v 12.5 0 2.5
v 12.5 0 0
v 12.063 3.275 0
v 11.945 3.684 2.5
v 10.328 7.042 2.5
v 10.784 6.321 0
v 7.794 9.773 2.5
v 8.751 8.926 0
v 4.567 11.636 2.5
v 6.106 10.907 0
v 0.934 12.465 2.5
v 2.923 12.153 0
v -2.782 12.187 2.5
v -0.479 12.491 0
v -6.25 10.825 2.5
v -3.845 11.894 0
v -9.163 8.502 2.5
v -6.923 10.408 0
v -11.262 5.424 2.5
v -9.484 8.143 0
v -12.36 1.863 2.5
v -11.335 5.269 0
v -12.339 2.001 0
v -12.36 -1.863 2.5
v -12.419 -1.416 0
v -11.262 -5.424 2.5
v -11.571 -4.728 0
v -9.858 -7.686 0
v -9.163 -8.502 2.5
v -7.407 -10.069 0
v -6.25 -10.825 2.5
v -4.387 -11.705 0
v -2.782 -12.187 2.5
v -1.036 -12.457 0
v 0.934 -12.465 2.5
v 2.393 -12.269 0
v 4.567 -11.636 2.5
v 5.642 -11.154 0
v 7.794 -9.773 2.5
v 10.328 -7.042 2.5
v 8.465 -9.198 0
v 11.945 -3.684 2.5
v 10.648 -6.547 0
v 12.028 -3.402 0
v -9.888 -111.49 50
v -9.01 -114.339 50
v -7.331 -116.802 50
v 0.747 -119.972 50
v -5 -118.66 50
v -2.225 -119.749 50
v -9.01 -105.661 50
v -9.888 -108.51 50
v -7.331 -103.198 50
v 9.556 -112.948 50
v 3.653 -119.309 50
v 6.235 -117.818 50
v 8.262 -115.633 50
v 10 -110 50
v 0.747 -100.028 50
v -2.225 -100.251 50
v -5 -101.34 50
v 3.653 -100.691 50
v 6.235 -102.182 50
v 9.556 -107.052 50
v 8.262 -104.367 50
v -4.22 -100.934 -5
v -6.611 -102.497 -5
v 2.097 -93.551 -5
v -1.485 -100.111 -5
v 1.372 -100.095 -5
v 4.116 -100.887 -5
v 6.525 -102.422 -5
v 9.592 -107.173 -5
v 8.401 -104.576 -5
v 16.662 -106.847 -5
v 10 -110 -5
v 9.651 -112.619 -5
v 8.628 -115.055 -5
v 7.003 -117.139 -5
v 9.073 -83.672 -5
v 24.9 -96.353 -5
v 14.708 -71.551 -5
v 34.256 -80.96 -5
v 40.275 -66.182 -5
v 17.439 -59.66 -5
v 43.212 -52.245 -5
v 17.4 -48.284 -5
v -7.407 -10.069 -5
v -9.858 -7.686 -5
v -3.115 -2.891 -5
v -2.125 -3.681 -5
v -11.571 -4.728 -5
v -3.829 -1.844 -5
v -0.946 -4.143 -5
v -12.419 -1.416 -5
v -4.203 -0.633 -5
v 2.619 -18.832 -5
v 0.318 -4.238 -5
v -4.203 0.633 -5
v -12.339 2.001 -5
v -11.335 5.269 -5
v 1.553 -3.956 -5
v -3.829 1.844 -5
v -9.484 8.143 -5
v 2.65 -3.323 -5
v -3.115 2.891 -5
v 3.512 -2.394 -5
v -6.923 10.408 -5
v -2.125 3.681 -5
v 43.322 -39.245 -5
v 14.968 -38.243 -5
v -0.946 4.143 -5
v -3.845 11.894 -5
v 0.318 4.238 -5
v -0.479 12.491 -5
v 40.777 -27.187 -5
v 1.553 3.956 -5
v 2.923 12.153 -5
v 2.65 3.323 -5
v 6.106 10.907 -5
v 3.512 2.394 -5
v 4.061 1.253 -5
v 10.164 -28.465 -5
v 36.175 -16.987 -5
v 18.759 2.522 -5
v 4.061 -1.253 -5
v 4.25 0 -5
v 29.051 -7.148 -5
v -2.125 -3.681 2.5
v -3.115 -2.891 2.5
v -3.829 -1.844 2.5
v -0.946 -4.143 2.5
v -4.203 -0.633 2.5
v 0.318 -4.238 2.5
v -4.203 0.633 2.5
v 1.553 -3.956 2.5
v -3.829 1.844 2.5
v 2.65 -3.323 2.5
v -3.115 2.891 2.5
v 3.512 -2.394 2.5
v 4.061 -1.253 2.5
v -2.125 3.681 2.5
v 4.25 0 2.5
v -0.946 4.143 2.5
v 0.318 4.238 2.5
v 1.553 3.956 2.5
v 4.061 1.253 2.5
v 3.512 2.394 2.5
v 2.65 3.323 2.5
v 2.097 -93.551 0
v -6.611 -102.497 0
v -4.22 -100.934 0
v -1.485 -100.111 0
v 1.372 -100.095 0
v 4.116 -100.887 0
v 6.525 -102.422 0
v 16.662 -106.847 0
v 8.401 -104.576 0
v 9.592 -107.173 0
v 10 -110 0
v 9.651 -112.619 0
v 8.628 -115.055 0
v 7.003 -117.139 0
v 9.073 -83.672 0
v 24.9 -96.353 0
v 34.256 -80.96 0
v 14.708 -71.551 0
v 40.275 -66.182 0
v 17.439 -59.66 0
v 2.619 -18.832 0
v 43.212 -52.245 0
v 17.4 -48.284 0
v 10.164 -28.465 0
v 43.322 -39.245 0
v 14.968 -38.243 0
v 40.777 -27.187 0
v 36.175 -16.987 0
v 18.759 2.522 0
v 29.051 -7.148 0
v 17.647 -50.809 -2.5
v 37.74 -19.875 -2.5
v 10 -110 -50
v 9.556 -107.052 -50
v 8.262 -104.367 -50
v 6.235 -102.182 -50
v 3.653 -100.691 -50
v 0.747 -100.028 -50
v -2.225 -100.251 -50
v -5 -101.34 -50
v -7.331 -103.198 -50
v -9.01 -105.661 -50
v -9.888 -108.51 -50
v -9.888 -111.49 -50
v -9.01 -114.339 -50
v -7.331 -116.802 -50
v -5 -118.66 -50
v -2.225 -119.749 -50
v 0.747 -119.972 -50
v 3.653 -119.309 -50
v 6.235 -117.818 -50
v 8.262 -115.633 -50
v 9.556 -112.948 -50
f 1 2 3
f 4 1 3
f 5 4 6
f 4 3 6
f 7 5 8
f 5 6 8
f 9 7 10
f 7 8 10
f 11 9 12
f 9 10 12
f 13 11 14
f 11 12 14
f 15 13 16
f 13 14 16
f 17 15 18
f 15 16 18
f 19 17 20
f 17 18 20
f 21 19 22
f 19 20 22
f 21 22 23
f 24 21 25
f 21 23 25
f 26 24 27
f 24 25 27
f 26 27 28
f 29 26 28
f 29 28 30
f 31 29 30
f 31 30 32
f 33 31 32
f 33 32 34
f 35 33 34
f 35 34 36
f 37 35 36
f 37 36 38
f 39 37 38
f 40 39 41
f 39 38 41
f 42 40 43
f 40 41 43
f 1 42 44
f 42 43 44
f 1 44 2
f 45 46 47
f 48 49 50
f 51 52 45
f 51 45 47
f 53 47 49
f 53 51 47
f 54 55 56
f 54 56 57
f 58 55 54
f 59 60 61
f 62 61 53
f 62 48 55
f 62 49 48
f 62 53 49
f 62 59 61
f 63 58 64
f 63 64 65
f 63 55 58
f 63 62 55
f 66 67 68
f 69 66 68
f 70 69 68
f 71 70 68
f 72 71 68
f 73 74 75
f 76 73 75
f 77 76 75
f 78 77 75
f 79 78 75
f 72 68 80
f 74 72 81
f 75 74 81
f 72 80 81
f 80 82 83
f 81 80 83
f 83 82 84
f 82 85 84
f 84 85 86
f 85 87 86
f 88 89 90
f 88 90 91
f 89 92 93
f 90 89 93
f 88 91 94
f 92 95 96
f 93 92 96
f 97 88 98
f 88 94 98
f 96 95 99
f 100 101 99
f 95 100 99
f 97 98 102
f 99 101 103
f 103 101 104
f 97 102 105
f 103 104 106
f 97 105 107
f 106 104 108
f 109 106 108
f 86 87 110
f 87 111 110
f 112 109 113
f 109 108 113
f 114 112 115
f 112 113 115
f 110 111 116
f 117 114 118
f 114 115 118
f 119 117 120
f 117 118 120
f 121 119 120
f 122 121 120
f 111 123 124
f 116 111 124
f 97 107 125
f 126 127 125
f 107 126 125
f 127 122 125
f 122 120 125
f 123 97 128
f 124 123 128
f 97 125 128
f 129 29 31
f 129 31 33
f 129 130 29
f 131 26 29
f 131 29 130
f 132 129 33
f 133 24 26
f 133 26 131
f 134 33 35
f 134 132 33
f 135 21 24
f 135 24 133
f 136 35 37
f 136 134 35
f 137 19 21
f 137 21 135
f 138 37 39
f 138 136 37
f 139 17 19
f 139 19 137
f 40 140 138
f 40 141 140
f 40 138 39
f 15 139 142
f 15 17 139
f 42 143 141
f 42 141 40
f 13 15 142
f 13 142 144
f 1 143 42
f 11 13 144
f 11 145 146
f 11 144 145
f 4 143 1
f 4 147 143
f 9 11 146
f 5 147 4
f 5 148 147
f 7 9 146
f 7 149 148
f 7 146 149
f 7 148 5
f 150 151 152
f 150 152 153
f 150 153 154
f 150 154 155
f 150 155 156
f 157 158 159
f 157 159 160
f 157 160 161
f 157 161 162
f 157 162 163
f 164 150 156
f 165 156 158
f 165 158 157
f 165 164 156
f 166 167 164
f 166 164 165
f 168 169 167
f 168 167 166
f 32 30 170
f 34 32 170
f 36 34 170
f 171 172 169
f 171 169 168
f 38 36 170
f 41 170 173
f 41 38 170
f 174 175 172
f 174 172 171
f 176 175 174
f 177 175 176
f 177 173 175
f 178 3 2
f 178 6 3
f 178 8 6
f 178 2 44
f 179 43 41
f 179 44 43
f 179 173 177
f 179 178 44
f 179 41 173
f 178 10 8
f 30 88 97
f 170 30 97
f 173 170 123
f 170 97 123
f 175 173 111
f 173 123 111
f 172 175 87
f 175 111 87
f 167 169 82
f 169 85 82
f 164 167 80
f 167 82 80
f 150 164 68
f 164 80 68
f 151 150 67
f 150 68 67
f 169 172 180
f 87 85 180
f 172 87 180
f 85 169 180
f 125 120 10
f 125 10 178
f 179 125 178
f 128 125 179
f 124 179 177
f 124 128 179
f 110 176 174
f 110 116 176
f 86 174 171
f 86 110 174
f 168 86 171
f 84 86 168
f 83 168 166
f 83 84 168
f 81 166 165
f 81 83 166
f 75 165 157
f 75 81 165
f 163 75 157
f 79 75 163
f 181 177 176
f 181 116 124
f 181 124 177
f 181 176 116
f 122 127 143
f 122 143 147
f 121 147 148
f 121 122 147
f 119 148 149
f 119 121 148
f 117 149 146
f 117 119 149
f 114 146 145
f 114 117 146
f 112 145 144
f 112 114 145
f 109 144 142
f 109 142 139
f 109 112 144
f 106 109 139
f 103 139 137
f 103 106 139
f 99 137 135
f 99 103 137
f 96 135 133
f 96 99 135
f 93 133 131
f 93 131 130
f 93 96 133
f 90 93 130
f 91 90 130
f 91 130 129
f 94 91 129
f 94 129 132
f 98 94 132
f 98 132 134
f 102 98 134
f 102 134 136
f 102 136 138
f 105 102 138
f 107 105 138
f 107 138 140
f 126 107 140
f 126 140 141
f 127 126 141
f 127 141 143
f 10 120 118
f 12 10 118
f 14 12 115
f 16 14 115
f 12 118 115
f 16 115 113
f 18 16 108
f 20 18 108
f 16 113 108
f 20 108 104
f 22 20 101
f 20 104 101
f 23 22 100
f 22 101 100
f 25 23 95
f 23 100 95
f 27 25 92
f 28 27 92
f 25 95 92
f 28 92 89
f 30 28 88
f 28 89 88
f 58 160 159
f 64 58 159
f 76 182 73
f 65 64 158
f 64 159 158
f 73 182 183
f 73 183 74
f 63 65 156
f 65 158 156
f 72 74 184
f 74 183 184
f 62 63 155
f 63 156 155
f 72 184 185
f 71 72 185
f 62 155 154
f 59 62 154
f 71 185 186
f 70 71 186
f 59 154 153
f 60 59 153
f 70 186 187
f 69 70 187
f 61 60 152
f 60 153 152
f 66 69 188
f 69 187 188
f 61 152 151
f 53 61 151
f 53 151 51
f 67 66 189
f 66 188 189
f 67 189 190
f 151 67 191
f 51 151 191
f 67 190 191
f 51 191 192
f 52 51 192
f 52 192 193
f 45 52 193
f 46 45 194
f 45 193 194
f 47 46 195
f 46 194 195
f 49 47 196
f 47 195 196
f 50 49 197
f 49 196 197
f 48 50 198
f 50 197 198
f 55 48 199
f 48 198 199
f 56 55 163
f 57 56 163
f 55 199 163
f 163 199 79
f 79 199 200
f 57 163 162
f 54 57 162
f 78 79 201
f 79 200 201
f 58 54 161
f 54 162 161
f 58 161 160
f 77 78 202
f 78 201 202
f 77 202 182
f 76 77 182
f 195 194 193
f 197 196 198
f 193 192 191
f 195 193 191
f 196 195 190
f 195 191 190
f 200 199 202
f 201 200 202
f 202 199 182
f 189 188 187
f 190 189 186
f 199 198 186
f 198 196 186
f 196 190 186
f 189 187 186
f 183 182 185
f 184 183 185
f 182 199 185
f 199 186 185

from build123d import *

# Parameters (mm, degrees)
SKETCH1_R                = 12.5
SKETCH1_R_2              = 4.25
BOSS_EXTRUDE1_DEPTH      = 2.5
BOSS_EXTRUDE2_START      = 5
BOSS_EXTRUDE2_DEPTH      = 5
BOSS_EXTRUDE3_DEPTH      = 50
BOSS_EXTRUDE3_DEPTH_BACK = 50
SKETCH3_R                = 10
CUT_EXTRUDE1_START       = -40
SKETCH4_R                = 4.25
CUT_EXTRUDE1_DEPTH       = 40


with BuildPart() as part:
    # Sketch1 → Boss-Extrude1 (new body)
    with BuildSketch(Plane.XY):
        Circle(SKETCH1_R)
        Circle(SKETCH1_R_2, mode=Mode.SUBTRACT)
    extrude(amount=BOSS_EXTRUDE1_DEPTH)

    # Sketch2 → Boss-Extrude2 (add)
    with BuildSketch(Plane(origin=(0, 0, 0), x_dir=(-1, 0, 0), z_dir=(0, 0, -1)).offset(BOSS_EXTRUDE2_START)):
        with BuildLine():
            ThreePointArc((-6.106396375, 10.906966733), (10.50822507, 6.769579446), (7.406819033, -10.069212075))
            add(Edge.make_bspline(
                [(7.406819033, -10.069212075), (-7.979907505, -21.387545439), (-26.855730435, -52.646283336), (-9.439793984, -88.354039493), (6.611094261, -102.497105047)],
                knots=[0, 0, 0, 0, 0.455821989, 1, 1, 1, 1], degree=3))
            ThreePointArc((6.611094261, -102.497105047), (7.323414251, -116.809376161), (-7.00278738, -117.138695182))
            add(Edge.make_bspline(
                [(-6.106396375, 10.906966733), (-20.621715475, 2.78039093), (-57.030134585, -32.014511607), (-40.003016754, -84.766730291), (-7.00278738, -117.138695182)],
                knots=[0, 0, 0, 0, 0.30202419, 1, 1, 1, 1], degree=3))
        make_face()
    extrude(amount=-BOSS_EXTRUDE2_DEPTH)

    # Sketch3 → Boss-Extrude3 (add, two sides: drawn at the far end of the back side and taken through both)
    with BuildSketch(Plane.XY.offset(-BOSS_EXTRUDE3_DEPTH_BACK)):
        with Locations((0, -110)):
            Circle(SKETCH3_R)
    extrude(amount=BOSS_EXTRUDE3_DEPTH + BOSS_EXTRUDE3_DEPTH_BACK)

    # Sketch4 → Cut-Extrude1 (cut)
    with BuildSketch(Plane.XY.offset(CUT_EXTRUDE1_START)):
        Circle(SKETCH4_R)
    extrude(amount=CUT_EXTRUDE1_DEPTH, mode=Mode.SUBTRACT)


solid = part.part
